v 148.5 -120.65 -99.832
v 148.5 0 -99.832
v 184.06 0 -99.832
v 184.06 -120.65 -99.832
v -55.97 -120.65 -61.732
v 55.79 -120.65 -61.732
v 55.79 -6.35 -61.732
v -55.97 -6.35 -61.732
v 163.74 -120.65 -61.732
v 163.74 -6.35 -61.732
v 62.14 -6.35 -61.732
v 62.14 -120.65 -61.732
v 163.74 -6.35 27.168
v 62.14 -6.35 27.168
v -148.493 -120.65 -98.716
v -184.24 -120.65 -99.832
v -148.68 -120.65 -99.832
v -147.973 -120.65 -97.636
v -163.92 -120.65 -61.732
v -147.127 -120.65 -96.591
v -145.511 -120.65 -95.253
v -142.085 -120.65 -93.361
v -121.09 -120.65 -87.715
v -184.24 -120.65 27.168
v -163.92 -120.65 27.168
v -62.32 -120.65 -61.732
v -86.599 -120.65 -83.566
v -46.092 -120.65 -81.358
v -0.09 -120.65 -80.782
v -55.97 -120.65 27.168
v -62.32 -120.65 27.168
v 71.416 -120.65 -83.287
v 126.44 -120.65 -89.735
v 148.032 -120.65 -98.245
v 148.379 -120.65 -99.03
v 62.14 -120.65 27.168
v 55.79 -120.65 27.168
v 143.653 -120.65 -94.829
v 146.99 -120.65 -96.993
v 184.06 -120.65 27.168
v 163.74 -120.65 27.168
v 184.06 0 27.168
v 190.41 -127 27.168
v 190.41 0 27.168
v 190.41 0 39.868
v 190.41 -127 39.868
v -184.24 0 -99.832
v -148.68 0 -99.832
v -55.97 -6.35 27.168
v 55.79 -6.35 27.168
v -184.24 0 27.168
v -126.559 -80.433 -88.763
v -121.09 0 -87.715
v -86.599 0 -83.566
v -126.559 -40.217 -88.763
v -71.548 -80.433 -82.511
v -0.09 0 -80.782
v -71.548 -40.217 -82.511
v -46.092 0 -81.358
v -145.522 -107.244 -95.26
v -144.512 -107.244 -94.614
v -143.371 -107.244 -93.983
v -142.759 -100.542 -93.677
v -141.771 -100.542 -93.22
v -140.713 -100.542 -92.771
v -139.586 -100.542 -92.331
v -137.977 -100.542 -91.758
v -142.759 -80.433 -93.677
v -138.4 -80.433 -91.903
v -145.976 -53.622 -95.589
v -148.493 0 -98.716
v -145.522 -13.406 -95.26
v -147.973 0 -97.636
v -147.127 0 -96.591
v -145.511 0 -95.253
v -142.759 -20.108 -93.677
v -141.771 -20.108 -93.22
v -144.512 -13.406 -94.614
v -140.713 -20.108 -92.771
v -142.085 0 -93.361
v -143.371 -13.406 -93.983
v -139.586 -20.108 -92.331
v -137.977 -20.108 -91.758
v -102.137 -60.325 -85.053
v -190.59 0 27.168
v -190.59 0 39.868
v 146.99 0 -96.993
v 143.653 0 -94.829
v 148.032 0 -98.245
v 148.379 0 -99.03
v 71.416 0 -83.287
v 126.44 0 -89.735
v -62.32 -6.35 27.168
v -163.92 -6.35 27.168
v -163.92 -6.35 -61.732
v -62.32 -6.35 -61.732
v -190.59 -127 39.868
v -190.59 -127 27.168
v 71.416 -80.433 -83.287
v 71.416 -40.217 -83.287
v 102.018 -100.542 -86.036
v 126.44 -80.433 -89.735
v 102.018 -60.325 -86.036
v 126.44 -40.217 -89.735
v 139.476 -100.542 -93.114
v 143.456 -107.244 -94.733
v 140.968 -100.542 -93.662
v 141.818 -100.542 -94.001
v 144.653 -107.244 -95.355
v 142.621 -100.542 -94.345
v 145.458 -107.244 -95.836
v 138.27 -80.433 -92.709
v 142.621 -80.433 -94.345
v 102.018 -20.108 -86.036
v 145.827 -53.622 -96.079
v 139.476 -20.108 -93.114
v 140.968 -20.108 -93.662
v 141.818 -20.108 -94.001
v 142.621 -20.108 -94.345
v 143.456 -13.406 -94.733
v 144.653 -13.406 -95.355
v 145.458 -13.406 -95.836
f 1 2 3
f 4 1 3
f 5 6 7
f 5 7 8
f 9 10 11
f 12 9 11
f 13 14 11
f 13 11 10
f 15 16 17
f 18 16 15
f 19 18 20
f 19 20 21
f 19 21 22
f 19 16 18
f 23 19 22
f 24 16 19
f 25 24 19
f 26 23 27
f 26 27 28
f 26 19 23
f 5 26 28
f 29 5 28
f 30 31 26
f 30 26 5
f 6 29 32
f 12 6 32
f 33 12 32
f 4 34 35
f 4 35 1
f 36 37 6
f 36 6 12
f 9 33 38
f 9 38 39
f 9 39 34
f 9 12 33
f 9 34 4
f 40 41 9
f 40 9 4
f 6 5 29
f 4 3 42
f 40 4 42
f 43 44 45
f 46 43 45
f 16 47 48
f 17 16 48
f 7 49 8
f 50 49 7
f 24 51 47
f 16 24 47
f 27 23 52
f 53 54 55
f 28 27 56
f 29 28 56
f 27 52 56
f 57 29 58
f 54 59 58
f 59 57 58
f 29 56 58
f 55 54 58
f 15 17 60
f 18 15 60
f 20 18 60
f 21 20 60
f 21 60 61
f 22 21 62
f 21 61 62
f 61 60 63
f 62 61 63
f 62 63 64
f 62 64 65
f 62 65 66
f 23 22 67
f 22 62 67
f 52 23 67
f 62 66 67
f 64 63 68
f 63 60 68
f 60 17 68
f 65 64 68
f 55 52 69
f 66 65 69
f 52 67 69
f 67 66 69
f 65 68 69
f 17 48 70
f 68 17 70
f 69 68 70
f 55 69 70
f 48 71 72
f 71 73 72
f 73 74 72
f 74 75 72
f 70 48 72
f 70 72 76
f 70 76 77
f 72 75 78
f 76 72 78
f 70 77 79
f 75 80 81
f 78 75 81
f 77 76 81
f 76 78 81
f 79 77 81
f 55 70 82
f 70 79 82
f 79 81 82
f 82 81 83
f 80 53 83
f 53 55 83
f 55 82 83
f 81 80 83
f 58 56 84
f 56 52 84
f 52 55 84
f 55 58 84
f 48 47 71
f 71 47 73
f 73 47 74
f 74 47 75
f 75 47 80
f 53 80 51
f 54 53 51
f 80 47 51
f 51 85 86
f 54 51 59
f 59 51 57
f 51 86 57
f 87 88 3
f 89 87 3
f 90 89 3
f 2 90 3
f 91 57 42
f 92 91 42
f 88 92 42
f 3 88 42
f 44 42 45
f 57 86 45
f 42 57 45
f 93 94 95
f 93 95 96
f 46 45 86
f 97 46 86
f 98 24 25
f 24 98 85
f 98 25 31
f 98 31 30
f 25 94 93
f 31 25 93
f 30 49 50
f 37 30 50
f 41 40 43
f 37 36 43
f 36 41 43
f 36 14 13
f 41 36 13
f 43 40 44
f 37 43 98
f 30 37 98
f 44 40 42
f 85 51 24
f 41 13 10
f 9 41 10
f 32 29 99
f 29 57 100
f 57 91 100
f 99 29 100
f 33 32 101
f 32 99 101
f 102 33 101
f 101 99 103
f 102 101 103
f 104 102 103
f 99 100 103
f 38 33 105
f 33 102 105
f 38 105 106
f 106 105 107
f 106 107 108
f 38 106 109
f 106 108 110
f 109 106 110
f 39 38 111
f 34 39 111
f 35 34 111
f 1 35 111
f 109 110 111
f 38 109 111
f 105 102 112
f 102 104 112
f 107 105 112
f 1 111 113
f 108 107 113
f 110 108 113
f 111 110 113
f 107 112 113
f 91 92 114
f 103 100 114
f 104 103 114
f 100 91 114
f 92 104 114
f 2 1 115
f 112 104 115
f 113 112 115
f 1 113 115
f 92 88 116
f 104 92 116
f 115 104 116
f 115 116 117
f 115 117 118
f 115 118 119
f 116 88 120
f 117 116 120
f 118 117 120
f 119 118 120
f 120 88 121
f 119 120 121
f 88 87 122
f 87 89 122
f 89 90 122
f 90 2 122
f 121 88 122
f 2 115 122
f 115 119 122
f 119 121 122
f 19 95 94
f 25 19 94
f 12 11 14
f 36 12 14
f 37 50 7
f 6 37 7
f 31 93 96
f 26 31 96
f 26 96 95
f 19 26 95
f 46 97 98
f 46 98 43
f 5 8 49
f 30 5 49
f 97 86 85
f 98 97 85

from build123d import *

# Parameters (mm, degrees)
F1_DEPTH = 127
F0_W     = 20.32
F0_H     = 12.833738
F0_H_2   = 10.154468
F2_DEPTH = 120.65
F0_W_2   = 111.76
F0_H_3   = 17.412408
F3_DEPTH = 6.35


with BuildPart() as f1:
    # F0 (on Front) → F1 (new body)
    with BuildSketch(Plane.XZ):
        Polygon((190.410141, 39.868113), (-190.589859, 39.868113), (-190.589859, 27.168113), (-184.239859, 27.168113), (-163.919859, 27.168113), (-62.319859, 27.168113), (-55.969859, 27.168113), (55.790141, 27.168113), (62.140141, 27.168113), (163.740141, 27.168113), (184.060141, 27.168113), (190.410141, 27.168113), align=None)
    extrude(amount=F1_DEPTH)

    # F0 (on Front) → F2 (join)
    with BuildSketch(Plane.XZ):
        with BuildLine():
            Line((-163.919859, -61.731887), (-184.239859, -61.731887))
            Line((-184.239859, -61.731887), (-184.239859, -99.831887))
            Line((-184.239859, -99.831887), (-148.679859, -99.831887))
            add(Edge.make_bspline(
                [(-148.679859, -99.831887), (-148.487159, -86.25736), (-74.288484, -80.346777), (-0.089859, -80.781887)],
                knots=[0, 0, 0, 0, 148.535829, 148.535829, 148.535829, 148.535829], degree=3))
            Line((-0.089859, -80.781887), (-0.089859, -61.731887))
            Line((-0.089859, -61.731887), (-55.969859, -61.731887))
            Line((-55.969859, -61.731887), (-62.319859, -61.731887))
            Line((-62.319859, -61.731887), (-163.919859, -61.731887))
        make_face()
        with BuildLine():
            Line((184.060141, -99.831887), (184.060141, -61.731887))
            Line((184.060141, -61.731887), (163.740141, -61.731887))
            Line((163.740141, -61.731887), (62.140141, -61.731887))
            Line((62.140141, -61.731887), (55.790141, -61.731887))
            Line((55.790141, -61.731887), (-0.089859, -61.731887))
            Line((-0.089859, -61.731887), (-0.089859, -80.781887))
            add(Edge.make_bspline(
                [(-0.089859, -80.781887), (74.162886, -81.217313), (148.41558, -88.007693), (148.500141, -99.831887)],
                knots=[148.535829, 148.535829, 148.535829, 148.535829, 297.18, 297.18, 297.18, 297.18], degree=3))
            Line((148.500141, -99.831887), (184.060141, -99.831887))
        make_face()
        with Locations((173.900141, -55.315018)):
            Rectangle(F0_W, F0_H)
        Polygon((184.060141, -48.898149), (184.060141, 27.168113), (163.740141, 27.168113), (163.740141, -24.726205), (163.740141, -48.898149), align=None)
        Polygon((62.140141, -9.948243), (62.140141, 27.168113), (55.790141, 27.168113), (55.790141, 9.755705), (55.790141, -9.948243), align=None)
        Polygon((62.140141, -24.726205), (62.140141, -9.948243), (55.790141, -9.948243), (55.790141, -61.731887), (62.140141, -61.731887), align=None)
        Polygon((-163.919859, 27.168113), (-184.239859, 27.168113), (-184.239859, -51.577419), (-163.919859, -51.577419), (-163.919859, -26.83734), align=None)
        with Locations((-174.079859, -56.654653)):
            Rectangle(F0_W, F0_H_2)
        Polygon((-55.969859, 27.168113), (-62.319859, 27.168113), (-62.319859, -2.911118), (-55.969859, -2.911118), (-55.969859, 9.755705), align=None)
        Polygon((-55.969859, -2.911118), (-62.319859, -2.911118), (-62.319859, -26.83734), (-62.319859, -61.731887), (-55.969859, -61.731887), align=None)
    extrude(amount=F2_DEPTH)

    # F0 (on Front) → F3 (join)
    with BuildSketch(Plane.XZ):
        Polygon((-62.319859, 27.168113), (-163.919859, 27.168113), (-163.919859, -26.83734), (-62.319859, -26.83734), (-62.319859, -2.911118), align=None)
        Polygon((-163.919859, -26.83734), (-163.919859, -51.577419), (-163.919859, -61.731887), (-62.319859, -61.731887), (-62.319859, -26.83734), align=None)
        with Locations((-0.089859, 18.461909)):
            Rectangle(F0_W_2, F0_H_3)
        Polygon((55.790141, 9.755705), (-55.969859, 9.755705), (-55.969859, -2.911118), (-55.969859, -61.731887), (-0.089859, -61.731887), (55.790141, -61.731887), (55.790141, -9.948243), align=None)
        Polygon((163.740141, -24.726205), (163.740141, 27.168113), (62.140141, 27.168113), (62.140141, -9.948243), (62.140141, -24.726205), align=None)
        Polygon((163.740141, -61.731887), (163.740141, -48.898149), (163.740141, -24.726205), (62.140141, -24.726205), (62.140141, -61.731887), align=None)
    extrude(amount=F3_DEPTH)


solid = f1.part
